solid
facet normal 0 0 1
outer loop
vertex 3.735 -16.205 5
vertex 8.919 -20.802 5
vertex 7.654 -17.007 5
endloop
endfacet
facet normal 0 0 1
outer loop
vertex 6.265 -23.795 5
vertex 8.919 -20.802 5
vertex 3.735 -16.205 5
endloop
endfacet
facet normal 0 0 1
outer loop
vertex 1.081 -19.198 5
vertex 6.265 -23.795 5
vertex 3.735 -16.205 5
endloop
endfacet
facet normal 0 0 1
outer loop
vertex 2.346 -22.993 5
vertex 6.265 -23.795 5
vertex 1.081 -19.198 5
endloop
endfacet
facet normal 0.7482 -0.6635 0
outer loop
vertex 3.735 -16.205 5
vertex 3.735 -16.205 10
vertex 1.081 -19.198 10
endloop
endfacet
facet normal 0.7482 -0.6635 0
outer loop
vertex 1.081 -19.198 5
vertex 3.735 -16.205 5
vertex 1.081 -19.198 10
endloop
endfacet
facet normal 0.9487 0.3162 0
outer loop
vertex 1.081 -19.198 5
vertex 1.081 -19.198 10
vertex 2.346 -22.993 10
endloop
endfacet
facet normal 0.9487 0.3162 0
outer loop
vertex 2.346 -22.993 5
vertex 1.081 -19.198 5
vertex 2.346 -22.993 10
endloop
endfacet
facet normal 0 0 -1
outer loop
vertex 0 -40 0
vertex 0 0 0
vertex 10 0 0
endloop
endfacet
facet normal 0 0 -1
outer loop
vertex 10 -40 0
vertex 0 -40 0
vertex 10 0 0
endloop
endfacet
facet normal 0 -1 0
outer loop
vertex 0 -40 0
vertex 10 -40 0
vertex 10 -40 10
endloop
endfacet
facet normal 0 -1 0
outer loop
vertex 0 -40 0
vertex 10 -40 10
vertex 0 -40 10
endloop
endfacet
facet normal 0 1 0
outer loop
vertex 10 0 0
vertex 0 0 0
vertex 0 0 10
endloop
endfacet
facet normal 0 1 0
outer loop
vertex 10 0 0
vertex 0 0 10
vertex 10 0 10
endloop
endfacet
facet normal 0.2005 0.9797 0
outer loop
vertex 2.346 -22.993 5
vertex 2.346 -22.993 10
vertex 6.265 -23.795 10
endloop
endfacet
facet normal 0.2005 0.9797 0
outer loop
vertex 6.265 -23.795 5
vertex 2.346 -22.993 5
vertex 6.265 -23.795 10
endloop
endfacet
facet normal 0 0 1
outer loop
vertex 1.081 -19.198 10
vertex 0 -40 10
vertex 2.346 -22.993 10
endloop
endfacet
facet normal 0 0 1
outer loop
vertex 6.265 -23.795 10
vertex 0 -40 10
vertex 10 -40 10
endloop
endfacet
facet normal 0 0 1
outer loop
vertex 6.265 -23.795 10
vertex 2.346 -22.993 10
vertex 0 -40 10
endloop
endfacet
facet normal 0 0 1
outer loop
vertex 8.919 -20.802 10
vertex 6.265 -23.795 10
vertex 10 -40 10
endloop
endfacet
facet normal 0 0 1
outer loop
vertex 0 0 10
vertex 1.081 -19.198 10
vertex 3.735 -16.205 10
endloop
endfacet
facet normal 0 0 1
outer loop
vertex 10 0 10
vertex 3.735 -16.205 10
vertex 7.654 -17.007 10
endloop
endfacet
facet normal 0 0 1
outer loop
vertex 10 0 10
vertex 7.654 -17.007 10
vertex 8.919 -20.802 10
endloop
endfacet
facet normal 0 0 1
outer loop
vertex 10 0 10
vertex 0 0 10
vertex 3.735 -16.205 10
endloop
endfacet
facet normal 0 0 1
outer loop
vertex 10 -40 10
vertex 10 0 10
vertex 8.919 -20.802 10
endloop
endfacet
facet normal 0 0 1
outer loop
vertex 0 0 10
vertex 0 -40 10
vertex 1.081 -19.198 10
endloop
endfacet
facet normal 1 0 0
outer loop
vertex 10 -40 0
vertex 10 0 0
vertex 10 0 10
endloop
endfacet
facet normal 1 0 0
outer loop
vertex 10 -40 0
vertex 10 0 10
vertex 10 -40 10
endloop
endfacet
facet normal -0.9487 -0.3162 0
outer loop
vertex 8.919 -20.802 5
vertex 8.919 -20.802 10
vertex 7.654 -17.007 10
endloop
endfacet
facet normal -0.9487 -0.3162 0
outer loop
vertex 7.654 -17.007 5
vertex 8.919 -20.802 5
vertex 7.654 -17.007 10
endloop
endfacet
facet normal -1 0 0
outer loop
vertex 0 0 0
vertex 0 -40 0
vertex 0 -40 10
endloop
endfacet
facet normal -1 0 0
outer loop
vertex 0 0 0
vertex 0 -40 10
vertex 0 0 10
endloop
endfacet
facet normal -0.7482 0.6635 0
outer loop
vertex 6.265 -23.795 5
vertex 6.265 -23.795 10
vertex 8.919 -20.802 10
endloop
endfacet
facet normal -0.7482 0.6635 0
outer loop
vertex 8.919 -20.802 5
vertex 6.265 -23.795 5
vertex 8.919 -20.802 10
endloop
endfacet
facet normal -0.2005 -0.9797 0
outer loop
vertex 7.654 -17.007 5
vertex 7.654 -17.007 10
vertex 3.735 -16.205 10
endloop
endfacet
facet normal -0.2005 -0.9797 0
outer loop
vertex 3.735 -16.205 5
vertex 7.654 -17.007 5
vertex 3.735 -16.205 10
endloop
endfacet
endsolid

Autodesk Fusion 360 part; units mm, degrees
sketch "Sketch1" plane through (0, 0, 0) normal (0, 0, 1) x (1, 0, 0)
  line L0 (0, 0) -> (10, 0)
  line L1 (10, 0) -> (10, -40)
  line L2 (10, -40) -> (0, -40)
  line L3 (0, -40) -> (0, 0)
  dimension "d1" = 40
  dimension "d2" = 10
extrude "Extrude1" add sketch "Sketch1" along normal blind 10
sketch "Sketch2" plane through (0, 0, 10) normal (0, 0, 1) x (-1, 0, 0)
  line L0 (0, 40) -> (-10, 40)
  line L1 (-10, 40) -> (-10, 0)
  line L2 (-10, 0) -> (0, 0)
  line L3 (0, 0) -> (0, 40)
  line L4 (-6.2649, 23.7947) -> (-8.9188, 20.8019)
  line L5 (-8.9188, 20.8019) -> (-7.6539, 17.0072)
  line L6 (-7.6539, 17.0072) -> (-3.7351, 16.2053)
  line L7 (-3.7351, 16.2053) -> (-1.0812, 19.1981)
  line L8 (-1.0812, 19.1981) -> (-2.3461, 22.9928)
  line L9 (-2.3461, 22.9928) -> (-6.2649, 23.7947)
  point P0 (-5, 20)
  dimension "d5" = 4
extrude "Extrude2" cut sketch "Sketch2" against normal blind 5 contours L4 L5 L6 L7 L8 L9
